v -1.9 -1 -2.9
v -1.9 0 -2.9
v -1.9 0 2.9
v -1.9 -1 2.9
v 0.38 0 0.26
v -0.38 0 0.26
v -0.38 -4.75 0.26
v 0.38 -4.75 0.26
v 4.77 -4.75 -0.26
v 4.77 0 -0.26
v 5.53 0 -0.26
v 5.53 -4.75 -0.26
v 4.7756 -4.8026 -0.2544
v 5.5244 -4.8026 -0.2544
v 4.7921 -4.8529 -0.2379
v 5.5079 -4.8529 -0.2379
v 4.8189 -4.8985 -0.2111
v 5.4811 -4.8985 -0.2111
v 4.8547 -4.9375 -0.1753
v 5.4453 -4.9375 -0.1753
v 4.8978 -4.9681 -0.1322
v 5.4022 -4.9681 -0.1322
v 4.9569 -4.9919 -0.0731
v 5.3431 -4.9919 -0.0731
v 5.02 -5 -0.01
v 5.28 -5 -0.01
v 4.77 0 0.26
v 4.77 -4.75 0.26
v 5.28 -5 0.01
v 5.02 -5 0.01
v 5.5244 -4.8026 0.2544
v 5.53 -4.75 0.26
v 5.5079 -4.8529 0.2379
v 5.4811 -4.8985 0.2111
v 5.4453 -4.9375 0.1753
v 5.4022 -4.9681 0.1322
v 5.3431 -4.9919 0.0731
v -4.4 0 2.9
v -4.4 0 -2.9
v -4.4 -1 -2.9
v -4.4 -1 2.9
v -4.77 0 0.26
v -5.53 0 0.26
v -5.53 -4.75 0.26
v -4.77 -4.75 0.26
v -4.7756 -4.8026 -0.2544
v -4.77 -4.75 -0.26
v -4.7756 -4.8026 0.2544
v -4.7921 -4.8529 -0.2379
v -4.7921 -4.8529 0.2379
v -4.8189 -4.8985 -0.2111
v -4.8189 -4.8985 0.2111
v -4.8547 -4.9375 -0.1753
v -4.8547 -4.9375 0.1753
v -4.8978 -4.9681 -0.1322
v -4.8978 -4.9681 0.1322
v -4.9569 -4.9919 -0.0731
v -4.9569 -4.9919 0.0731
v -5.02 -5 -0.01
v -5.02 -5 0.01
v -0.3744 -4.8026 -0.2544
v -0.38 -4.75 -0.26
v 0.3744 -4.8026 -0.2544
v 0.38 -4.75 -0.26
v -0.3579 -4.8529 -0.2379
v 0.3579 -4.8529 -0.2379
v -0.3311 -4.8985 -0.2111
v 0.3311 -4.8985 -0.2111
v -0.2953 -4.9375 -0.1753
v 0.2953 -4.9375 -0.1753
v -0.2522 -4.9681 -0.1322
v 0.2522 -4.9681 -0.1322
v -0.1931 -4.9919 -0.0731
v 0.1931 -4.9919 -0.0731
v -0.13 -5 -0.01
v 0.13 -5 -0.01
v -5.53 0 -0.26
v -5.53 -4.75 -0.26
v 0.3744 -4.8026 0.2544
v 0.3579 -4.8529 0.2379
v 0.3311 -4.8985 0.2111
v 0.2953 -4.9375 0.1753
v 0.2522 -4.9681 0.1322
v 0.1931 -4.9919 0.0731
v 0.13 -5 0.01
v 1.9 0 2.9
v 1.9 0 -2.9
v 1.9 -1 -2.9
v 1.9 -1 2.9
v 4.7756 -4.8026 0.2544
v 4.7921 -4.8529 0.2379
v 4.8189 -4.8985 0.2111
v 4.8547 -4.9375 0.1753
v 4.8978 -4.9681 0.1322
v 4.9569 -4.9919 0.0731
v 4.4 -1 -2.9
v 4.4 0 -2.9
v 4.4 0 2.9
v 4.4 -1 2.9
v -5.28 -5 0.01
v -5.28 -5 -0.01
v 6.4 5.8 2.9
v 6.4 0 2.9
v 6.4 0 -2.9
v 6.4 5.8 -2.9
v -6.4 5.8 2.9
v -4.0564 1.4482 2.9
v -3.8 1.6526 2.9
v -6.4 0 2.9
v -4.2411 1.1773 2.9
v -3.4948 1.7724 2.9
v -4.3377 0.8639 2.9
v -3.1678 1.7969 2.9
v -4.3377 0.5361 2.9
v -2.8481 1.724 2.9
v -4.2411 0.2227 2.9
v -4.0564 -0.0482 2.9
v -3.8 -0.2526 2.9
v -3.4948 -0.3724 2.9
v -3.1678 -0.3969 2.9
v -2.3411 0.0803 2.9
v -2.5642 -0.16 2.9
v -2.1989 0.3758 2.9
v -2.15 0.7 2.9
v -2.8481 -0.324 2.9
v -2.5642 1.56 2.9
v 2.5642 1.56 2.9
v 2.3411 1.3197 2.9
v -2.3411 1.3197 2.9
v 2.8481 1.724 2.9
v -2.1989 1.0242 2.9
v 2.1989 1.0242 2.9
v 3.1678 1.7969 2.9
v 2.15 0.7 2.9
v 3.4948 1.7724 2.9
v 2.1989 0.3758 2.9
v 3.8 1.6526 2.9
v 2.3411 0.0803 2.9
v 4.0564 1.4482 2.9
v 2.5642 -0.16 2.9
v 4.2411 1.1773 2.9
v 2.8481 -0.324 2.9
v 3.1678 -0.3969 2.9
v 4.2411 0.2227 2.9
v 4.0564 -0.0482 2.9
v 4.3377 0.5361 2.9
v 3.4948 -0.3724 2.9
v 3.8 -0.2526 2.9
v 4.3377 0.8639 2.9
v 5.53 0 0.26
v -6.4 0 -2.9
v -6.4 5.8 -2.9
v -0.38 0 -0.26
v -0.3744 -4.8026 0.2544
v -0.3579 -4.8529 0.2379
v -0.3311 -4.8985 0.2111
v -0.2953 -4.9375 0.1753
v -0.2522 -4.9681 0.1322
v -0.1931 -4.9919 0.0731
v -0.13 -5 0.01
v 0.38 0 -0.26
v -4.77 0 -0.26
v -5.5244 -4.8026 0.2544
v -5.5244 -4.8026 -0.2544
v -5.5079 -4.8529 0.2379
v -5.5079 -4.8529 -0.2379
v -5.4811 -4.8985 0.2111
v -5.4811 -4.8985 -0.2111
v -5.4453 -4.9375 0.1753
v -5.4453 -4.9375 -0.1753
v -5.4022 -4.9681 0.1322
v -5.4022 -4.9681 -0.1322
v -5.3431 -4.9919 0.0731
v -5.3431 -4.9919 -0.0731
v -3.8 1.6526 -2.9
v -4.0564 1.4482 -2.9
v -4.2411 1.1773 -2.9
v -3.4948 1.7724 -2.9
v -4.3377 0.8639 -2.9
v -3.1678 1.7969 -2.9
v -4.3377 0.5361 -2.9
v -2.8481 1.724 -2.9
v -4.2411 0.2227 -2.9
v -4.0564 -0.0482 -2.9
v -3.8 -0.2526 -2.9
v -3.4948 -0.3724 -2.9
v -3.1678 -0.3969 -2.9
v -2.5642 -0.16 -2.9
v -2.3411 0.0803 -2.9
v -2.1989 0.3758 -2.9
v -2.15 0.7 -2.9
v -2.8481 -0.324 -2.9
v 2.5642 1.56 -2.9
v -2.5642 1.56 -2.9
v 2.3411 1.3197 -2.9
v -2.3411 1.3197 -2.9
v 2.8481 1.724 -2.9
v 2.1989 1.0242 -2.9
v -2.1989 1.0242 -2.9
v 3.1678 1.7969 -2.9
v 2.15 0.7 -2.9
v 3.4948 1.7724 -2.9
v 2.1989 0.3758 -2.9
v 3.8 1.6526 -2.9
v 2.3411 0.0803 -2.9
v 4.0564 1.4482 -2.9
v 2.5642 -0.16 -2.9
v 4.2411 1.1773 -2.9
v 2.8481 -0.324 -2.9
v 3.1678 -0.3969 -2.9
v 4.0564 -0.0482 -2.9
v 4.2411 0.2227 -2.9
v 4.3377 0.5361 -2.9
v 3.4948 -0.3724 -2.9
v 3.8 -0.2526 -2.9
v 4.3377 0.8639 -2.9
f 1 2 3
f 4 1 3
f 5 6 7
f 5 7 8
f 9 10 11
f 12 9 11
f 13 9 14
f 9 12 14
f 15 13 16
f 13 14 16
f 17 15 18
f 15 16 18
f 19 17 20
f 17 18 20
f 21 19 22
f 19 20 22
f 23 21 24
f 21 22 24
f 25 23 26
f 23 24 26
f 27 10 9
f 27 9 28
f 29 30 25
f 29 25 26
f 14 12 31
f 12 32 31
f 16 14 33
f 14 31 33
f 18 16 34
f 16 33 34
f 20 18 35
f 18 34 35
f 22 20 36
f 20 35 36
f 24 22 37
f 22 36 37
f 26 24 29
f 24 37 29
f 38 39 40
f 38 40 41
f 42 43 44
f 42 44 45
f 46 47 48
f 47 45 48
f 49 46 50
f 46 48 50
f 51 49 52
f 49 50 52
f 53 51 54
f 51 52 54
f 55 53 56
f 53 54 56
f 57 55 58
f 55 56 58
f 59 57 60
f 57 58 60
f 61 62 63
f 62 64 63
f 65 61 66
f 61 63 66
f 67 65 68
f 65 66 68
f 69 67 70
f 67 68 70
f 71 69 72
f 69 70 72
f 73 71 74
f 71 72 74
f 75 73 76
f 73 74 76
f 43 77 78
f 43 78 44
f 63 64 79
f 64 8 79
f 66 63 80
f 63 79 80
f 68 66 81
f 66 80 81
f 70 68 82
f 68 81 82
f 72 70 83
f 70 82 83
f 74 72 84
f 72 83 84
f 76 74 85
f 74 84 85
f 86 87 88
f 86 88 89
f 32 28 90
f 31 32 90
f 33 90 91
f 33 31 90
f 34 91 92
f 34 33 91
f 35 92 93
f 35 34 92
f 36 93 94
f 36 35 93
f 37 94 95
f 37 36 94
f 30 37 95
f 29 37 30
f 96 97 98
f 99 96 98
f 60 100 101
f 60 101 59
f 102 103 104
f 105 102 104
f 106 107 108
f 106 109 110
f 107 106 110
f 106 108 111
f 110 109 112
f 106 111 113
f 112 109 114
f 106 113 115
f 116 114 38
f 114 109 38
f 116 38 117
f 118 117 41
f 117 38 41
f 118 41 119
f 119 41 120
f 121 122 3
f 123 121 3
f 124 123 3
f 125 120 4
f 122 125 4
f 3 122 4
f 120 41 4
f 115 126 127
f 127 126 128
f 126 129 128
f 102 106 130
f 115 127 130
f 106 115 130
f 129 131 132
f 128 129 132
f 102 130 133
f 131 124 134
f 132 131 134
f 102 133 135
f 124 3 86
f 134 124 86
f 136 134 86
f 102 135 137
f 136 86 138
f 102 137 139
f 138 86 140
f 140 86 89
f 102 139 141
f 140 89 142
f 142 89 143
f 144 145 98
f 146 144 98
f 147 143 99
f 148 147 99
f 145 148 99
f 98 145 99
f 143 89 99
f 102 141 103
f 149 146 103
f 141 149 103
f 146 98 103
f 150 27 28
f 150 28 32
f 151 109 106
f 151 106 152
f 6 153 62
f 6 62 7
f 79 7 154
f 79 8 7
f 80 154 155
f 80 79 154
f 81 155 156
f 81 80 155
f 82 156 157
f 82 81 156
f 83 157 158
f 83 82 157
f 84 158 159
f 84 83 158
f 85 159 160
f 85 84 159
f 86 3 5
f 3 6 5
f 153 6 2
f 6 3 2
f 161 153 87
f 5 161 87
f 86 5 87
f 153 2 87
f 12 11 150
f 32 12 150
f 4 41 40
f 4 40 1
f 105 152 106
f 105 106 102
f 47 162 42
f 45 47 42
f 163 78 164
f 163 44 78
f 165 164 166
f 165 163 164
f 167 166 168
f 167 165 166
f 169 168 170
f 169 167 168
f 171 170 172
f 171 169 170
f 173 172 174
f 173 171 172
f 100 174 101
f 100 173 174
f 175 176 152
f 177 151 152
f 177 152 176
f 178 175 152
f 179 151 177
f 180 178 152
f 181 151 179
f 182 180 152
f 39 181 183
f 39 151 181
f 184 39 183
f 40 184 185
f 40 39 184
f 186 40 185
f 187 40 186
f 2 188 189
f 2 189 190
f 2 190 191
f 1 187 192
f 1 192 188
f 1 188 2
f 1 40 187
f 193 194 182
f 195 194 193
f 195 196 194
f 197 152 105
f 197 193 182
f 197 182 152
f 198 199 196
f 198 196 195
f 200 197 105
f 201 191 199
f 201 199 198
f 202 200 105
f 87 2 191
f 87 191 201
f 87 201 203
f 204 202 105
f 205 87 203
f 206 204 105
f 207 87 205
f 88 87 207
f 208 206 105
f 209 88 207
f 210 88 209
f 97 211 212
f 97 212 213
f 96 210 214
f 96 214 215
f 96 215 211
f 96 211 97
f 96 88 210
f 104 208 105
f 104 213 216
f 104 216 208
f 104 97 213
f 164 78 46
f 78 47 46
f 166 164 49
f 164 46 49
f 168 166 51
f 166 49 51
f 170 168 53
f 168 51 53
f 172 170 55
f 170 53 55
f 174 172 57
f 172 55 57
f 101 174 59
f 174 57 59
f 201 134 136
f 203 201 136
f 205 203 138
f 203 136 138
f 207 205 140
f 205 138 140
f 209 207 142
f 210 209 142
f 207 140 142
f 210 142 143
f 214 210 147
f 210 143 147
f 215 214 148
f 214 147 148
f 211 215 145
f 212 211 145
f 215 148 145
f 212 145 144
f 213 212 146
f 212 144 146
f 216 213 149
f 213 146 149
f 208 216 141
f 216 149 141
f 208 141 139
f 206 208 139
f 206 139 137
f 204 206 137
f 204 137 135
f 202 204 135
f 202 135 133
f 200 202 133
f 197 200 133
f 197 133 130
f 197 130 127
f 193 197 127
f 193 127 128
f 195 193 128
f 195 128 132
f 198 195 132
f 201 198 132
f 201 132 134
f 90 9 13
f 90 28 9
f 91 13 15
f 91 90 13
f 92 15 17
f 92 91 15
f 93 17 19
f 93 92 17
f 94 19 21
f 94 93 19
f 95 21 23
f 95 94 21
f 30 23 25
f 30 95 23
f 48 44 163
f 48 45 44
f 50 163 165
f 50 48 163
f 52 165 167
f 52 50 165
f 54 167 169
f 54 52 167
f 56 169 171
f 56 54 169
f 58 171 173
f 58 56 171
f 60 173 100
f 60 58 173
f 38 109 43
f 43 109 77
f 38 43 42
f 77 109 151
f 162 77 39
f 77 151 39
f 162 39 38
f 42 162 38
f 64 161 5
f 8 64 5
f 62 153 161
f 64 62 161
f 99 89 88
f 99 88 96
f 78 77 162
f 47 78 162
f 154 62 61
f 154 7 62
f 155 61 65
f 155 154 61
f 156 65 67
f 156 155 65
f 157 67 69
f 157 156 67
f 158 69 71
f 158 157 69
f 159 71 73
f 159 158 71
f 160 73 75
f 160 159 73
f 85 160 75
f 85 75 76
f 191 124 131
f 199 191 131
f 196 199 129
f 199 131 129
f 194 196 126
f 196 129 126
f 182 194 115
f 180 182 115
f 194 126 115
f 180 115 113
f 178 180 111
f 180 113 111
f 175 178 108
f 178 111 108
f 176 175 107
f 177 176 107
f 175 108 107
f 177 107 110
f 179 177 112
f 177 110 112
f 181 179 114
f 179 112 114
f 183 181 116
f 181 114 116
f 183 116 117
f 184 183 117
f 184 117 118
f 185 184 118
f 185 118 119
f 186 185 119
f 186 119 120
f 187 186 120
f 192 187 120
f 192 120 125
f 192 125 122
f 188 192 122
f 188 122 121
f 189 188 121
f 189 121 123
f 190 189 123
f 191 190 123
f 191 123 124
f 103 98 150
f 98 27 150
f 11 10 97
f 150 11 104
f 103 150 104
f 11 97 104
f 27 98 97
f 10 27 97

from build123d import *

# Parameters (mm, degrees)
SKETCH_1_W          = 12.8
SKETCH_1_H          = 5.8
EXTRUDE_1_DEPTH     = 5.8
SKETCH_2_W          = 0.76
SKETCH_2_H          = 0.52
EXTRUDE_2_DEPTH     = 5
FILLET_3_R          = 0.25
SKETCH_4_W          = 2.5
SKETCH_4_H          = 5.8
EXTRUDE_3_DEPTH     = 1
SKETCH_3_R          = 1.1
CUT_EXTRUDE_1_DEPTH = 11.403845443


with BuildPart() as part:
    # 草图1 → 凸台-拉伸1 (new body)
    with BuildSketch(Plane(origin=(0, 0, 0), x_dir=(1, 0, 0), z_dir=(0, 1, 0))):
        Rectangle(SKETCH_1_W, SKETCH_1_H)
    extrude(amount=EXTRUDE_1_DEPTH)

    # 草图2 → 凸台-拉伸2 (add)
    with BuildSketch(Plane.XZ):
        Rectangle(SKETCH_2_W, SKETCH_2_H)
        with Locations((5.15, 0)):
            Rectangle(SKETCH_2_W, SKETCH_2_H)
        with Locations((-5.15, 0)):
            Rectangle(SKETCH_2_W, SKETCH_2_H)
    extrude(amount=EXTRUDE_2_DEPTH)

    # 圆角3
    fillet_3_edges = [part.edges().sort_by_distance(p)[0] for p in [
        (0.38, -5, 0),
        (0, -5, 0.26),
        (-0.38, -5, 0),
        (0, -5, -0.26),
        (5.15, -5, 0.26),
        (4.77, -5, 0),
        (5.15, -5, -0.26),
        (5.53, -5, 0),
        (-4.77, -5, 0),
        (-5.15, -5, 0.26),
        (-5.53, -5, 0),
        (-5.15, -5, -0.26),
    ]]
    fillet(fillet_3_edges, radius=FILLET_3_R)

    # 草图4 → 凸台-拉伸3 (add)
    with BuildSketch(Plane.XZ):
        with Locations((-3.15, 0)):
            Rectangle(SKETCH_4_W, SKETCH_4_H)
        with Locations((3.15, 0)):
            Rectangle(SKETCH_4_W, SKETCH_4_H)
    extrude(amount=EXTRUDE_3_DEPTH)

    # 草图3 → 切除-拉伸1 (cut, through all)
    with BuildSketch(Plane.XY.offset(2.9)):
        with Locations((-3.25, 0.7)):
            Circle(SKETCH_3_R)
        with Locations(Location((3.25, 0.7, 0), (0, 0, 180))):
            Circle(SKETCH_3_R)
    extrude(amount=-CUT_EXTRUDE_1_DEPTH, mode=Mode.SUBTRACT)


solid = part.part
